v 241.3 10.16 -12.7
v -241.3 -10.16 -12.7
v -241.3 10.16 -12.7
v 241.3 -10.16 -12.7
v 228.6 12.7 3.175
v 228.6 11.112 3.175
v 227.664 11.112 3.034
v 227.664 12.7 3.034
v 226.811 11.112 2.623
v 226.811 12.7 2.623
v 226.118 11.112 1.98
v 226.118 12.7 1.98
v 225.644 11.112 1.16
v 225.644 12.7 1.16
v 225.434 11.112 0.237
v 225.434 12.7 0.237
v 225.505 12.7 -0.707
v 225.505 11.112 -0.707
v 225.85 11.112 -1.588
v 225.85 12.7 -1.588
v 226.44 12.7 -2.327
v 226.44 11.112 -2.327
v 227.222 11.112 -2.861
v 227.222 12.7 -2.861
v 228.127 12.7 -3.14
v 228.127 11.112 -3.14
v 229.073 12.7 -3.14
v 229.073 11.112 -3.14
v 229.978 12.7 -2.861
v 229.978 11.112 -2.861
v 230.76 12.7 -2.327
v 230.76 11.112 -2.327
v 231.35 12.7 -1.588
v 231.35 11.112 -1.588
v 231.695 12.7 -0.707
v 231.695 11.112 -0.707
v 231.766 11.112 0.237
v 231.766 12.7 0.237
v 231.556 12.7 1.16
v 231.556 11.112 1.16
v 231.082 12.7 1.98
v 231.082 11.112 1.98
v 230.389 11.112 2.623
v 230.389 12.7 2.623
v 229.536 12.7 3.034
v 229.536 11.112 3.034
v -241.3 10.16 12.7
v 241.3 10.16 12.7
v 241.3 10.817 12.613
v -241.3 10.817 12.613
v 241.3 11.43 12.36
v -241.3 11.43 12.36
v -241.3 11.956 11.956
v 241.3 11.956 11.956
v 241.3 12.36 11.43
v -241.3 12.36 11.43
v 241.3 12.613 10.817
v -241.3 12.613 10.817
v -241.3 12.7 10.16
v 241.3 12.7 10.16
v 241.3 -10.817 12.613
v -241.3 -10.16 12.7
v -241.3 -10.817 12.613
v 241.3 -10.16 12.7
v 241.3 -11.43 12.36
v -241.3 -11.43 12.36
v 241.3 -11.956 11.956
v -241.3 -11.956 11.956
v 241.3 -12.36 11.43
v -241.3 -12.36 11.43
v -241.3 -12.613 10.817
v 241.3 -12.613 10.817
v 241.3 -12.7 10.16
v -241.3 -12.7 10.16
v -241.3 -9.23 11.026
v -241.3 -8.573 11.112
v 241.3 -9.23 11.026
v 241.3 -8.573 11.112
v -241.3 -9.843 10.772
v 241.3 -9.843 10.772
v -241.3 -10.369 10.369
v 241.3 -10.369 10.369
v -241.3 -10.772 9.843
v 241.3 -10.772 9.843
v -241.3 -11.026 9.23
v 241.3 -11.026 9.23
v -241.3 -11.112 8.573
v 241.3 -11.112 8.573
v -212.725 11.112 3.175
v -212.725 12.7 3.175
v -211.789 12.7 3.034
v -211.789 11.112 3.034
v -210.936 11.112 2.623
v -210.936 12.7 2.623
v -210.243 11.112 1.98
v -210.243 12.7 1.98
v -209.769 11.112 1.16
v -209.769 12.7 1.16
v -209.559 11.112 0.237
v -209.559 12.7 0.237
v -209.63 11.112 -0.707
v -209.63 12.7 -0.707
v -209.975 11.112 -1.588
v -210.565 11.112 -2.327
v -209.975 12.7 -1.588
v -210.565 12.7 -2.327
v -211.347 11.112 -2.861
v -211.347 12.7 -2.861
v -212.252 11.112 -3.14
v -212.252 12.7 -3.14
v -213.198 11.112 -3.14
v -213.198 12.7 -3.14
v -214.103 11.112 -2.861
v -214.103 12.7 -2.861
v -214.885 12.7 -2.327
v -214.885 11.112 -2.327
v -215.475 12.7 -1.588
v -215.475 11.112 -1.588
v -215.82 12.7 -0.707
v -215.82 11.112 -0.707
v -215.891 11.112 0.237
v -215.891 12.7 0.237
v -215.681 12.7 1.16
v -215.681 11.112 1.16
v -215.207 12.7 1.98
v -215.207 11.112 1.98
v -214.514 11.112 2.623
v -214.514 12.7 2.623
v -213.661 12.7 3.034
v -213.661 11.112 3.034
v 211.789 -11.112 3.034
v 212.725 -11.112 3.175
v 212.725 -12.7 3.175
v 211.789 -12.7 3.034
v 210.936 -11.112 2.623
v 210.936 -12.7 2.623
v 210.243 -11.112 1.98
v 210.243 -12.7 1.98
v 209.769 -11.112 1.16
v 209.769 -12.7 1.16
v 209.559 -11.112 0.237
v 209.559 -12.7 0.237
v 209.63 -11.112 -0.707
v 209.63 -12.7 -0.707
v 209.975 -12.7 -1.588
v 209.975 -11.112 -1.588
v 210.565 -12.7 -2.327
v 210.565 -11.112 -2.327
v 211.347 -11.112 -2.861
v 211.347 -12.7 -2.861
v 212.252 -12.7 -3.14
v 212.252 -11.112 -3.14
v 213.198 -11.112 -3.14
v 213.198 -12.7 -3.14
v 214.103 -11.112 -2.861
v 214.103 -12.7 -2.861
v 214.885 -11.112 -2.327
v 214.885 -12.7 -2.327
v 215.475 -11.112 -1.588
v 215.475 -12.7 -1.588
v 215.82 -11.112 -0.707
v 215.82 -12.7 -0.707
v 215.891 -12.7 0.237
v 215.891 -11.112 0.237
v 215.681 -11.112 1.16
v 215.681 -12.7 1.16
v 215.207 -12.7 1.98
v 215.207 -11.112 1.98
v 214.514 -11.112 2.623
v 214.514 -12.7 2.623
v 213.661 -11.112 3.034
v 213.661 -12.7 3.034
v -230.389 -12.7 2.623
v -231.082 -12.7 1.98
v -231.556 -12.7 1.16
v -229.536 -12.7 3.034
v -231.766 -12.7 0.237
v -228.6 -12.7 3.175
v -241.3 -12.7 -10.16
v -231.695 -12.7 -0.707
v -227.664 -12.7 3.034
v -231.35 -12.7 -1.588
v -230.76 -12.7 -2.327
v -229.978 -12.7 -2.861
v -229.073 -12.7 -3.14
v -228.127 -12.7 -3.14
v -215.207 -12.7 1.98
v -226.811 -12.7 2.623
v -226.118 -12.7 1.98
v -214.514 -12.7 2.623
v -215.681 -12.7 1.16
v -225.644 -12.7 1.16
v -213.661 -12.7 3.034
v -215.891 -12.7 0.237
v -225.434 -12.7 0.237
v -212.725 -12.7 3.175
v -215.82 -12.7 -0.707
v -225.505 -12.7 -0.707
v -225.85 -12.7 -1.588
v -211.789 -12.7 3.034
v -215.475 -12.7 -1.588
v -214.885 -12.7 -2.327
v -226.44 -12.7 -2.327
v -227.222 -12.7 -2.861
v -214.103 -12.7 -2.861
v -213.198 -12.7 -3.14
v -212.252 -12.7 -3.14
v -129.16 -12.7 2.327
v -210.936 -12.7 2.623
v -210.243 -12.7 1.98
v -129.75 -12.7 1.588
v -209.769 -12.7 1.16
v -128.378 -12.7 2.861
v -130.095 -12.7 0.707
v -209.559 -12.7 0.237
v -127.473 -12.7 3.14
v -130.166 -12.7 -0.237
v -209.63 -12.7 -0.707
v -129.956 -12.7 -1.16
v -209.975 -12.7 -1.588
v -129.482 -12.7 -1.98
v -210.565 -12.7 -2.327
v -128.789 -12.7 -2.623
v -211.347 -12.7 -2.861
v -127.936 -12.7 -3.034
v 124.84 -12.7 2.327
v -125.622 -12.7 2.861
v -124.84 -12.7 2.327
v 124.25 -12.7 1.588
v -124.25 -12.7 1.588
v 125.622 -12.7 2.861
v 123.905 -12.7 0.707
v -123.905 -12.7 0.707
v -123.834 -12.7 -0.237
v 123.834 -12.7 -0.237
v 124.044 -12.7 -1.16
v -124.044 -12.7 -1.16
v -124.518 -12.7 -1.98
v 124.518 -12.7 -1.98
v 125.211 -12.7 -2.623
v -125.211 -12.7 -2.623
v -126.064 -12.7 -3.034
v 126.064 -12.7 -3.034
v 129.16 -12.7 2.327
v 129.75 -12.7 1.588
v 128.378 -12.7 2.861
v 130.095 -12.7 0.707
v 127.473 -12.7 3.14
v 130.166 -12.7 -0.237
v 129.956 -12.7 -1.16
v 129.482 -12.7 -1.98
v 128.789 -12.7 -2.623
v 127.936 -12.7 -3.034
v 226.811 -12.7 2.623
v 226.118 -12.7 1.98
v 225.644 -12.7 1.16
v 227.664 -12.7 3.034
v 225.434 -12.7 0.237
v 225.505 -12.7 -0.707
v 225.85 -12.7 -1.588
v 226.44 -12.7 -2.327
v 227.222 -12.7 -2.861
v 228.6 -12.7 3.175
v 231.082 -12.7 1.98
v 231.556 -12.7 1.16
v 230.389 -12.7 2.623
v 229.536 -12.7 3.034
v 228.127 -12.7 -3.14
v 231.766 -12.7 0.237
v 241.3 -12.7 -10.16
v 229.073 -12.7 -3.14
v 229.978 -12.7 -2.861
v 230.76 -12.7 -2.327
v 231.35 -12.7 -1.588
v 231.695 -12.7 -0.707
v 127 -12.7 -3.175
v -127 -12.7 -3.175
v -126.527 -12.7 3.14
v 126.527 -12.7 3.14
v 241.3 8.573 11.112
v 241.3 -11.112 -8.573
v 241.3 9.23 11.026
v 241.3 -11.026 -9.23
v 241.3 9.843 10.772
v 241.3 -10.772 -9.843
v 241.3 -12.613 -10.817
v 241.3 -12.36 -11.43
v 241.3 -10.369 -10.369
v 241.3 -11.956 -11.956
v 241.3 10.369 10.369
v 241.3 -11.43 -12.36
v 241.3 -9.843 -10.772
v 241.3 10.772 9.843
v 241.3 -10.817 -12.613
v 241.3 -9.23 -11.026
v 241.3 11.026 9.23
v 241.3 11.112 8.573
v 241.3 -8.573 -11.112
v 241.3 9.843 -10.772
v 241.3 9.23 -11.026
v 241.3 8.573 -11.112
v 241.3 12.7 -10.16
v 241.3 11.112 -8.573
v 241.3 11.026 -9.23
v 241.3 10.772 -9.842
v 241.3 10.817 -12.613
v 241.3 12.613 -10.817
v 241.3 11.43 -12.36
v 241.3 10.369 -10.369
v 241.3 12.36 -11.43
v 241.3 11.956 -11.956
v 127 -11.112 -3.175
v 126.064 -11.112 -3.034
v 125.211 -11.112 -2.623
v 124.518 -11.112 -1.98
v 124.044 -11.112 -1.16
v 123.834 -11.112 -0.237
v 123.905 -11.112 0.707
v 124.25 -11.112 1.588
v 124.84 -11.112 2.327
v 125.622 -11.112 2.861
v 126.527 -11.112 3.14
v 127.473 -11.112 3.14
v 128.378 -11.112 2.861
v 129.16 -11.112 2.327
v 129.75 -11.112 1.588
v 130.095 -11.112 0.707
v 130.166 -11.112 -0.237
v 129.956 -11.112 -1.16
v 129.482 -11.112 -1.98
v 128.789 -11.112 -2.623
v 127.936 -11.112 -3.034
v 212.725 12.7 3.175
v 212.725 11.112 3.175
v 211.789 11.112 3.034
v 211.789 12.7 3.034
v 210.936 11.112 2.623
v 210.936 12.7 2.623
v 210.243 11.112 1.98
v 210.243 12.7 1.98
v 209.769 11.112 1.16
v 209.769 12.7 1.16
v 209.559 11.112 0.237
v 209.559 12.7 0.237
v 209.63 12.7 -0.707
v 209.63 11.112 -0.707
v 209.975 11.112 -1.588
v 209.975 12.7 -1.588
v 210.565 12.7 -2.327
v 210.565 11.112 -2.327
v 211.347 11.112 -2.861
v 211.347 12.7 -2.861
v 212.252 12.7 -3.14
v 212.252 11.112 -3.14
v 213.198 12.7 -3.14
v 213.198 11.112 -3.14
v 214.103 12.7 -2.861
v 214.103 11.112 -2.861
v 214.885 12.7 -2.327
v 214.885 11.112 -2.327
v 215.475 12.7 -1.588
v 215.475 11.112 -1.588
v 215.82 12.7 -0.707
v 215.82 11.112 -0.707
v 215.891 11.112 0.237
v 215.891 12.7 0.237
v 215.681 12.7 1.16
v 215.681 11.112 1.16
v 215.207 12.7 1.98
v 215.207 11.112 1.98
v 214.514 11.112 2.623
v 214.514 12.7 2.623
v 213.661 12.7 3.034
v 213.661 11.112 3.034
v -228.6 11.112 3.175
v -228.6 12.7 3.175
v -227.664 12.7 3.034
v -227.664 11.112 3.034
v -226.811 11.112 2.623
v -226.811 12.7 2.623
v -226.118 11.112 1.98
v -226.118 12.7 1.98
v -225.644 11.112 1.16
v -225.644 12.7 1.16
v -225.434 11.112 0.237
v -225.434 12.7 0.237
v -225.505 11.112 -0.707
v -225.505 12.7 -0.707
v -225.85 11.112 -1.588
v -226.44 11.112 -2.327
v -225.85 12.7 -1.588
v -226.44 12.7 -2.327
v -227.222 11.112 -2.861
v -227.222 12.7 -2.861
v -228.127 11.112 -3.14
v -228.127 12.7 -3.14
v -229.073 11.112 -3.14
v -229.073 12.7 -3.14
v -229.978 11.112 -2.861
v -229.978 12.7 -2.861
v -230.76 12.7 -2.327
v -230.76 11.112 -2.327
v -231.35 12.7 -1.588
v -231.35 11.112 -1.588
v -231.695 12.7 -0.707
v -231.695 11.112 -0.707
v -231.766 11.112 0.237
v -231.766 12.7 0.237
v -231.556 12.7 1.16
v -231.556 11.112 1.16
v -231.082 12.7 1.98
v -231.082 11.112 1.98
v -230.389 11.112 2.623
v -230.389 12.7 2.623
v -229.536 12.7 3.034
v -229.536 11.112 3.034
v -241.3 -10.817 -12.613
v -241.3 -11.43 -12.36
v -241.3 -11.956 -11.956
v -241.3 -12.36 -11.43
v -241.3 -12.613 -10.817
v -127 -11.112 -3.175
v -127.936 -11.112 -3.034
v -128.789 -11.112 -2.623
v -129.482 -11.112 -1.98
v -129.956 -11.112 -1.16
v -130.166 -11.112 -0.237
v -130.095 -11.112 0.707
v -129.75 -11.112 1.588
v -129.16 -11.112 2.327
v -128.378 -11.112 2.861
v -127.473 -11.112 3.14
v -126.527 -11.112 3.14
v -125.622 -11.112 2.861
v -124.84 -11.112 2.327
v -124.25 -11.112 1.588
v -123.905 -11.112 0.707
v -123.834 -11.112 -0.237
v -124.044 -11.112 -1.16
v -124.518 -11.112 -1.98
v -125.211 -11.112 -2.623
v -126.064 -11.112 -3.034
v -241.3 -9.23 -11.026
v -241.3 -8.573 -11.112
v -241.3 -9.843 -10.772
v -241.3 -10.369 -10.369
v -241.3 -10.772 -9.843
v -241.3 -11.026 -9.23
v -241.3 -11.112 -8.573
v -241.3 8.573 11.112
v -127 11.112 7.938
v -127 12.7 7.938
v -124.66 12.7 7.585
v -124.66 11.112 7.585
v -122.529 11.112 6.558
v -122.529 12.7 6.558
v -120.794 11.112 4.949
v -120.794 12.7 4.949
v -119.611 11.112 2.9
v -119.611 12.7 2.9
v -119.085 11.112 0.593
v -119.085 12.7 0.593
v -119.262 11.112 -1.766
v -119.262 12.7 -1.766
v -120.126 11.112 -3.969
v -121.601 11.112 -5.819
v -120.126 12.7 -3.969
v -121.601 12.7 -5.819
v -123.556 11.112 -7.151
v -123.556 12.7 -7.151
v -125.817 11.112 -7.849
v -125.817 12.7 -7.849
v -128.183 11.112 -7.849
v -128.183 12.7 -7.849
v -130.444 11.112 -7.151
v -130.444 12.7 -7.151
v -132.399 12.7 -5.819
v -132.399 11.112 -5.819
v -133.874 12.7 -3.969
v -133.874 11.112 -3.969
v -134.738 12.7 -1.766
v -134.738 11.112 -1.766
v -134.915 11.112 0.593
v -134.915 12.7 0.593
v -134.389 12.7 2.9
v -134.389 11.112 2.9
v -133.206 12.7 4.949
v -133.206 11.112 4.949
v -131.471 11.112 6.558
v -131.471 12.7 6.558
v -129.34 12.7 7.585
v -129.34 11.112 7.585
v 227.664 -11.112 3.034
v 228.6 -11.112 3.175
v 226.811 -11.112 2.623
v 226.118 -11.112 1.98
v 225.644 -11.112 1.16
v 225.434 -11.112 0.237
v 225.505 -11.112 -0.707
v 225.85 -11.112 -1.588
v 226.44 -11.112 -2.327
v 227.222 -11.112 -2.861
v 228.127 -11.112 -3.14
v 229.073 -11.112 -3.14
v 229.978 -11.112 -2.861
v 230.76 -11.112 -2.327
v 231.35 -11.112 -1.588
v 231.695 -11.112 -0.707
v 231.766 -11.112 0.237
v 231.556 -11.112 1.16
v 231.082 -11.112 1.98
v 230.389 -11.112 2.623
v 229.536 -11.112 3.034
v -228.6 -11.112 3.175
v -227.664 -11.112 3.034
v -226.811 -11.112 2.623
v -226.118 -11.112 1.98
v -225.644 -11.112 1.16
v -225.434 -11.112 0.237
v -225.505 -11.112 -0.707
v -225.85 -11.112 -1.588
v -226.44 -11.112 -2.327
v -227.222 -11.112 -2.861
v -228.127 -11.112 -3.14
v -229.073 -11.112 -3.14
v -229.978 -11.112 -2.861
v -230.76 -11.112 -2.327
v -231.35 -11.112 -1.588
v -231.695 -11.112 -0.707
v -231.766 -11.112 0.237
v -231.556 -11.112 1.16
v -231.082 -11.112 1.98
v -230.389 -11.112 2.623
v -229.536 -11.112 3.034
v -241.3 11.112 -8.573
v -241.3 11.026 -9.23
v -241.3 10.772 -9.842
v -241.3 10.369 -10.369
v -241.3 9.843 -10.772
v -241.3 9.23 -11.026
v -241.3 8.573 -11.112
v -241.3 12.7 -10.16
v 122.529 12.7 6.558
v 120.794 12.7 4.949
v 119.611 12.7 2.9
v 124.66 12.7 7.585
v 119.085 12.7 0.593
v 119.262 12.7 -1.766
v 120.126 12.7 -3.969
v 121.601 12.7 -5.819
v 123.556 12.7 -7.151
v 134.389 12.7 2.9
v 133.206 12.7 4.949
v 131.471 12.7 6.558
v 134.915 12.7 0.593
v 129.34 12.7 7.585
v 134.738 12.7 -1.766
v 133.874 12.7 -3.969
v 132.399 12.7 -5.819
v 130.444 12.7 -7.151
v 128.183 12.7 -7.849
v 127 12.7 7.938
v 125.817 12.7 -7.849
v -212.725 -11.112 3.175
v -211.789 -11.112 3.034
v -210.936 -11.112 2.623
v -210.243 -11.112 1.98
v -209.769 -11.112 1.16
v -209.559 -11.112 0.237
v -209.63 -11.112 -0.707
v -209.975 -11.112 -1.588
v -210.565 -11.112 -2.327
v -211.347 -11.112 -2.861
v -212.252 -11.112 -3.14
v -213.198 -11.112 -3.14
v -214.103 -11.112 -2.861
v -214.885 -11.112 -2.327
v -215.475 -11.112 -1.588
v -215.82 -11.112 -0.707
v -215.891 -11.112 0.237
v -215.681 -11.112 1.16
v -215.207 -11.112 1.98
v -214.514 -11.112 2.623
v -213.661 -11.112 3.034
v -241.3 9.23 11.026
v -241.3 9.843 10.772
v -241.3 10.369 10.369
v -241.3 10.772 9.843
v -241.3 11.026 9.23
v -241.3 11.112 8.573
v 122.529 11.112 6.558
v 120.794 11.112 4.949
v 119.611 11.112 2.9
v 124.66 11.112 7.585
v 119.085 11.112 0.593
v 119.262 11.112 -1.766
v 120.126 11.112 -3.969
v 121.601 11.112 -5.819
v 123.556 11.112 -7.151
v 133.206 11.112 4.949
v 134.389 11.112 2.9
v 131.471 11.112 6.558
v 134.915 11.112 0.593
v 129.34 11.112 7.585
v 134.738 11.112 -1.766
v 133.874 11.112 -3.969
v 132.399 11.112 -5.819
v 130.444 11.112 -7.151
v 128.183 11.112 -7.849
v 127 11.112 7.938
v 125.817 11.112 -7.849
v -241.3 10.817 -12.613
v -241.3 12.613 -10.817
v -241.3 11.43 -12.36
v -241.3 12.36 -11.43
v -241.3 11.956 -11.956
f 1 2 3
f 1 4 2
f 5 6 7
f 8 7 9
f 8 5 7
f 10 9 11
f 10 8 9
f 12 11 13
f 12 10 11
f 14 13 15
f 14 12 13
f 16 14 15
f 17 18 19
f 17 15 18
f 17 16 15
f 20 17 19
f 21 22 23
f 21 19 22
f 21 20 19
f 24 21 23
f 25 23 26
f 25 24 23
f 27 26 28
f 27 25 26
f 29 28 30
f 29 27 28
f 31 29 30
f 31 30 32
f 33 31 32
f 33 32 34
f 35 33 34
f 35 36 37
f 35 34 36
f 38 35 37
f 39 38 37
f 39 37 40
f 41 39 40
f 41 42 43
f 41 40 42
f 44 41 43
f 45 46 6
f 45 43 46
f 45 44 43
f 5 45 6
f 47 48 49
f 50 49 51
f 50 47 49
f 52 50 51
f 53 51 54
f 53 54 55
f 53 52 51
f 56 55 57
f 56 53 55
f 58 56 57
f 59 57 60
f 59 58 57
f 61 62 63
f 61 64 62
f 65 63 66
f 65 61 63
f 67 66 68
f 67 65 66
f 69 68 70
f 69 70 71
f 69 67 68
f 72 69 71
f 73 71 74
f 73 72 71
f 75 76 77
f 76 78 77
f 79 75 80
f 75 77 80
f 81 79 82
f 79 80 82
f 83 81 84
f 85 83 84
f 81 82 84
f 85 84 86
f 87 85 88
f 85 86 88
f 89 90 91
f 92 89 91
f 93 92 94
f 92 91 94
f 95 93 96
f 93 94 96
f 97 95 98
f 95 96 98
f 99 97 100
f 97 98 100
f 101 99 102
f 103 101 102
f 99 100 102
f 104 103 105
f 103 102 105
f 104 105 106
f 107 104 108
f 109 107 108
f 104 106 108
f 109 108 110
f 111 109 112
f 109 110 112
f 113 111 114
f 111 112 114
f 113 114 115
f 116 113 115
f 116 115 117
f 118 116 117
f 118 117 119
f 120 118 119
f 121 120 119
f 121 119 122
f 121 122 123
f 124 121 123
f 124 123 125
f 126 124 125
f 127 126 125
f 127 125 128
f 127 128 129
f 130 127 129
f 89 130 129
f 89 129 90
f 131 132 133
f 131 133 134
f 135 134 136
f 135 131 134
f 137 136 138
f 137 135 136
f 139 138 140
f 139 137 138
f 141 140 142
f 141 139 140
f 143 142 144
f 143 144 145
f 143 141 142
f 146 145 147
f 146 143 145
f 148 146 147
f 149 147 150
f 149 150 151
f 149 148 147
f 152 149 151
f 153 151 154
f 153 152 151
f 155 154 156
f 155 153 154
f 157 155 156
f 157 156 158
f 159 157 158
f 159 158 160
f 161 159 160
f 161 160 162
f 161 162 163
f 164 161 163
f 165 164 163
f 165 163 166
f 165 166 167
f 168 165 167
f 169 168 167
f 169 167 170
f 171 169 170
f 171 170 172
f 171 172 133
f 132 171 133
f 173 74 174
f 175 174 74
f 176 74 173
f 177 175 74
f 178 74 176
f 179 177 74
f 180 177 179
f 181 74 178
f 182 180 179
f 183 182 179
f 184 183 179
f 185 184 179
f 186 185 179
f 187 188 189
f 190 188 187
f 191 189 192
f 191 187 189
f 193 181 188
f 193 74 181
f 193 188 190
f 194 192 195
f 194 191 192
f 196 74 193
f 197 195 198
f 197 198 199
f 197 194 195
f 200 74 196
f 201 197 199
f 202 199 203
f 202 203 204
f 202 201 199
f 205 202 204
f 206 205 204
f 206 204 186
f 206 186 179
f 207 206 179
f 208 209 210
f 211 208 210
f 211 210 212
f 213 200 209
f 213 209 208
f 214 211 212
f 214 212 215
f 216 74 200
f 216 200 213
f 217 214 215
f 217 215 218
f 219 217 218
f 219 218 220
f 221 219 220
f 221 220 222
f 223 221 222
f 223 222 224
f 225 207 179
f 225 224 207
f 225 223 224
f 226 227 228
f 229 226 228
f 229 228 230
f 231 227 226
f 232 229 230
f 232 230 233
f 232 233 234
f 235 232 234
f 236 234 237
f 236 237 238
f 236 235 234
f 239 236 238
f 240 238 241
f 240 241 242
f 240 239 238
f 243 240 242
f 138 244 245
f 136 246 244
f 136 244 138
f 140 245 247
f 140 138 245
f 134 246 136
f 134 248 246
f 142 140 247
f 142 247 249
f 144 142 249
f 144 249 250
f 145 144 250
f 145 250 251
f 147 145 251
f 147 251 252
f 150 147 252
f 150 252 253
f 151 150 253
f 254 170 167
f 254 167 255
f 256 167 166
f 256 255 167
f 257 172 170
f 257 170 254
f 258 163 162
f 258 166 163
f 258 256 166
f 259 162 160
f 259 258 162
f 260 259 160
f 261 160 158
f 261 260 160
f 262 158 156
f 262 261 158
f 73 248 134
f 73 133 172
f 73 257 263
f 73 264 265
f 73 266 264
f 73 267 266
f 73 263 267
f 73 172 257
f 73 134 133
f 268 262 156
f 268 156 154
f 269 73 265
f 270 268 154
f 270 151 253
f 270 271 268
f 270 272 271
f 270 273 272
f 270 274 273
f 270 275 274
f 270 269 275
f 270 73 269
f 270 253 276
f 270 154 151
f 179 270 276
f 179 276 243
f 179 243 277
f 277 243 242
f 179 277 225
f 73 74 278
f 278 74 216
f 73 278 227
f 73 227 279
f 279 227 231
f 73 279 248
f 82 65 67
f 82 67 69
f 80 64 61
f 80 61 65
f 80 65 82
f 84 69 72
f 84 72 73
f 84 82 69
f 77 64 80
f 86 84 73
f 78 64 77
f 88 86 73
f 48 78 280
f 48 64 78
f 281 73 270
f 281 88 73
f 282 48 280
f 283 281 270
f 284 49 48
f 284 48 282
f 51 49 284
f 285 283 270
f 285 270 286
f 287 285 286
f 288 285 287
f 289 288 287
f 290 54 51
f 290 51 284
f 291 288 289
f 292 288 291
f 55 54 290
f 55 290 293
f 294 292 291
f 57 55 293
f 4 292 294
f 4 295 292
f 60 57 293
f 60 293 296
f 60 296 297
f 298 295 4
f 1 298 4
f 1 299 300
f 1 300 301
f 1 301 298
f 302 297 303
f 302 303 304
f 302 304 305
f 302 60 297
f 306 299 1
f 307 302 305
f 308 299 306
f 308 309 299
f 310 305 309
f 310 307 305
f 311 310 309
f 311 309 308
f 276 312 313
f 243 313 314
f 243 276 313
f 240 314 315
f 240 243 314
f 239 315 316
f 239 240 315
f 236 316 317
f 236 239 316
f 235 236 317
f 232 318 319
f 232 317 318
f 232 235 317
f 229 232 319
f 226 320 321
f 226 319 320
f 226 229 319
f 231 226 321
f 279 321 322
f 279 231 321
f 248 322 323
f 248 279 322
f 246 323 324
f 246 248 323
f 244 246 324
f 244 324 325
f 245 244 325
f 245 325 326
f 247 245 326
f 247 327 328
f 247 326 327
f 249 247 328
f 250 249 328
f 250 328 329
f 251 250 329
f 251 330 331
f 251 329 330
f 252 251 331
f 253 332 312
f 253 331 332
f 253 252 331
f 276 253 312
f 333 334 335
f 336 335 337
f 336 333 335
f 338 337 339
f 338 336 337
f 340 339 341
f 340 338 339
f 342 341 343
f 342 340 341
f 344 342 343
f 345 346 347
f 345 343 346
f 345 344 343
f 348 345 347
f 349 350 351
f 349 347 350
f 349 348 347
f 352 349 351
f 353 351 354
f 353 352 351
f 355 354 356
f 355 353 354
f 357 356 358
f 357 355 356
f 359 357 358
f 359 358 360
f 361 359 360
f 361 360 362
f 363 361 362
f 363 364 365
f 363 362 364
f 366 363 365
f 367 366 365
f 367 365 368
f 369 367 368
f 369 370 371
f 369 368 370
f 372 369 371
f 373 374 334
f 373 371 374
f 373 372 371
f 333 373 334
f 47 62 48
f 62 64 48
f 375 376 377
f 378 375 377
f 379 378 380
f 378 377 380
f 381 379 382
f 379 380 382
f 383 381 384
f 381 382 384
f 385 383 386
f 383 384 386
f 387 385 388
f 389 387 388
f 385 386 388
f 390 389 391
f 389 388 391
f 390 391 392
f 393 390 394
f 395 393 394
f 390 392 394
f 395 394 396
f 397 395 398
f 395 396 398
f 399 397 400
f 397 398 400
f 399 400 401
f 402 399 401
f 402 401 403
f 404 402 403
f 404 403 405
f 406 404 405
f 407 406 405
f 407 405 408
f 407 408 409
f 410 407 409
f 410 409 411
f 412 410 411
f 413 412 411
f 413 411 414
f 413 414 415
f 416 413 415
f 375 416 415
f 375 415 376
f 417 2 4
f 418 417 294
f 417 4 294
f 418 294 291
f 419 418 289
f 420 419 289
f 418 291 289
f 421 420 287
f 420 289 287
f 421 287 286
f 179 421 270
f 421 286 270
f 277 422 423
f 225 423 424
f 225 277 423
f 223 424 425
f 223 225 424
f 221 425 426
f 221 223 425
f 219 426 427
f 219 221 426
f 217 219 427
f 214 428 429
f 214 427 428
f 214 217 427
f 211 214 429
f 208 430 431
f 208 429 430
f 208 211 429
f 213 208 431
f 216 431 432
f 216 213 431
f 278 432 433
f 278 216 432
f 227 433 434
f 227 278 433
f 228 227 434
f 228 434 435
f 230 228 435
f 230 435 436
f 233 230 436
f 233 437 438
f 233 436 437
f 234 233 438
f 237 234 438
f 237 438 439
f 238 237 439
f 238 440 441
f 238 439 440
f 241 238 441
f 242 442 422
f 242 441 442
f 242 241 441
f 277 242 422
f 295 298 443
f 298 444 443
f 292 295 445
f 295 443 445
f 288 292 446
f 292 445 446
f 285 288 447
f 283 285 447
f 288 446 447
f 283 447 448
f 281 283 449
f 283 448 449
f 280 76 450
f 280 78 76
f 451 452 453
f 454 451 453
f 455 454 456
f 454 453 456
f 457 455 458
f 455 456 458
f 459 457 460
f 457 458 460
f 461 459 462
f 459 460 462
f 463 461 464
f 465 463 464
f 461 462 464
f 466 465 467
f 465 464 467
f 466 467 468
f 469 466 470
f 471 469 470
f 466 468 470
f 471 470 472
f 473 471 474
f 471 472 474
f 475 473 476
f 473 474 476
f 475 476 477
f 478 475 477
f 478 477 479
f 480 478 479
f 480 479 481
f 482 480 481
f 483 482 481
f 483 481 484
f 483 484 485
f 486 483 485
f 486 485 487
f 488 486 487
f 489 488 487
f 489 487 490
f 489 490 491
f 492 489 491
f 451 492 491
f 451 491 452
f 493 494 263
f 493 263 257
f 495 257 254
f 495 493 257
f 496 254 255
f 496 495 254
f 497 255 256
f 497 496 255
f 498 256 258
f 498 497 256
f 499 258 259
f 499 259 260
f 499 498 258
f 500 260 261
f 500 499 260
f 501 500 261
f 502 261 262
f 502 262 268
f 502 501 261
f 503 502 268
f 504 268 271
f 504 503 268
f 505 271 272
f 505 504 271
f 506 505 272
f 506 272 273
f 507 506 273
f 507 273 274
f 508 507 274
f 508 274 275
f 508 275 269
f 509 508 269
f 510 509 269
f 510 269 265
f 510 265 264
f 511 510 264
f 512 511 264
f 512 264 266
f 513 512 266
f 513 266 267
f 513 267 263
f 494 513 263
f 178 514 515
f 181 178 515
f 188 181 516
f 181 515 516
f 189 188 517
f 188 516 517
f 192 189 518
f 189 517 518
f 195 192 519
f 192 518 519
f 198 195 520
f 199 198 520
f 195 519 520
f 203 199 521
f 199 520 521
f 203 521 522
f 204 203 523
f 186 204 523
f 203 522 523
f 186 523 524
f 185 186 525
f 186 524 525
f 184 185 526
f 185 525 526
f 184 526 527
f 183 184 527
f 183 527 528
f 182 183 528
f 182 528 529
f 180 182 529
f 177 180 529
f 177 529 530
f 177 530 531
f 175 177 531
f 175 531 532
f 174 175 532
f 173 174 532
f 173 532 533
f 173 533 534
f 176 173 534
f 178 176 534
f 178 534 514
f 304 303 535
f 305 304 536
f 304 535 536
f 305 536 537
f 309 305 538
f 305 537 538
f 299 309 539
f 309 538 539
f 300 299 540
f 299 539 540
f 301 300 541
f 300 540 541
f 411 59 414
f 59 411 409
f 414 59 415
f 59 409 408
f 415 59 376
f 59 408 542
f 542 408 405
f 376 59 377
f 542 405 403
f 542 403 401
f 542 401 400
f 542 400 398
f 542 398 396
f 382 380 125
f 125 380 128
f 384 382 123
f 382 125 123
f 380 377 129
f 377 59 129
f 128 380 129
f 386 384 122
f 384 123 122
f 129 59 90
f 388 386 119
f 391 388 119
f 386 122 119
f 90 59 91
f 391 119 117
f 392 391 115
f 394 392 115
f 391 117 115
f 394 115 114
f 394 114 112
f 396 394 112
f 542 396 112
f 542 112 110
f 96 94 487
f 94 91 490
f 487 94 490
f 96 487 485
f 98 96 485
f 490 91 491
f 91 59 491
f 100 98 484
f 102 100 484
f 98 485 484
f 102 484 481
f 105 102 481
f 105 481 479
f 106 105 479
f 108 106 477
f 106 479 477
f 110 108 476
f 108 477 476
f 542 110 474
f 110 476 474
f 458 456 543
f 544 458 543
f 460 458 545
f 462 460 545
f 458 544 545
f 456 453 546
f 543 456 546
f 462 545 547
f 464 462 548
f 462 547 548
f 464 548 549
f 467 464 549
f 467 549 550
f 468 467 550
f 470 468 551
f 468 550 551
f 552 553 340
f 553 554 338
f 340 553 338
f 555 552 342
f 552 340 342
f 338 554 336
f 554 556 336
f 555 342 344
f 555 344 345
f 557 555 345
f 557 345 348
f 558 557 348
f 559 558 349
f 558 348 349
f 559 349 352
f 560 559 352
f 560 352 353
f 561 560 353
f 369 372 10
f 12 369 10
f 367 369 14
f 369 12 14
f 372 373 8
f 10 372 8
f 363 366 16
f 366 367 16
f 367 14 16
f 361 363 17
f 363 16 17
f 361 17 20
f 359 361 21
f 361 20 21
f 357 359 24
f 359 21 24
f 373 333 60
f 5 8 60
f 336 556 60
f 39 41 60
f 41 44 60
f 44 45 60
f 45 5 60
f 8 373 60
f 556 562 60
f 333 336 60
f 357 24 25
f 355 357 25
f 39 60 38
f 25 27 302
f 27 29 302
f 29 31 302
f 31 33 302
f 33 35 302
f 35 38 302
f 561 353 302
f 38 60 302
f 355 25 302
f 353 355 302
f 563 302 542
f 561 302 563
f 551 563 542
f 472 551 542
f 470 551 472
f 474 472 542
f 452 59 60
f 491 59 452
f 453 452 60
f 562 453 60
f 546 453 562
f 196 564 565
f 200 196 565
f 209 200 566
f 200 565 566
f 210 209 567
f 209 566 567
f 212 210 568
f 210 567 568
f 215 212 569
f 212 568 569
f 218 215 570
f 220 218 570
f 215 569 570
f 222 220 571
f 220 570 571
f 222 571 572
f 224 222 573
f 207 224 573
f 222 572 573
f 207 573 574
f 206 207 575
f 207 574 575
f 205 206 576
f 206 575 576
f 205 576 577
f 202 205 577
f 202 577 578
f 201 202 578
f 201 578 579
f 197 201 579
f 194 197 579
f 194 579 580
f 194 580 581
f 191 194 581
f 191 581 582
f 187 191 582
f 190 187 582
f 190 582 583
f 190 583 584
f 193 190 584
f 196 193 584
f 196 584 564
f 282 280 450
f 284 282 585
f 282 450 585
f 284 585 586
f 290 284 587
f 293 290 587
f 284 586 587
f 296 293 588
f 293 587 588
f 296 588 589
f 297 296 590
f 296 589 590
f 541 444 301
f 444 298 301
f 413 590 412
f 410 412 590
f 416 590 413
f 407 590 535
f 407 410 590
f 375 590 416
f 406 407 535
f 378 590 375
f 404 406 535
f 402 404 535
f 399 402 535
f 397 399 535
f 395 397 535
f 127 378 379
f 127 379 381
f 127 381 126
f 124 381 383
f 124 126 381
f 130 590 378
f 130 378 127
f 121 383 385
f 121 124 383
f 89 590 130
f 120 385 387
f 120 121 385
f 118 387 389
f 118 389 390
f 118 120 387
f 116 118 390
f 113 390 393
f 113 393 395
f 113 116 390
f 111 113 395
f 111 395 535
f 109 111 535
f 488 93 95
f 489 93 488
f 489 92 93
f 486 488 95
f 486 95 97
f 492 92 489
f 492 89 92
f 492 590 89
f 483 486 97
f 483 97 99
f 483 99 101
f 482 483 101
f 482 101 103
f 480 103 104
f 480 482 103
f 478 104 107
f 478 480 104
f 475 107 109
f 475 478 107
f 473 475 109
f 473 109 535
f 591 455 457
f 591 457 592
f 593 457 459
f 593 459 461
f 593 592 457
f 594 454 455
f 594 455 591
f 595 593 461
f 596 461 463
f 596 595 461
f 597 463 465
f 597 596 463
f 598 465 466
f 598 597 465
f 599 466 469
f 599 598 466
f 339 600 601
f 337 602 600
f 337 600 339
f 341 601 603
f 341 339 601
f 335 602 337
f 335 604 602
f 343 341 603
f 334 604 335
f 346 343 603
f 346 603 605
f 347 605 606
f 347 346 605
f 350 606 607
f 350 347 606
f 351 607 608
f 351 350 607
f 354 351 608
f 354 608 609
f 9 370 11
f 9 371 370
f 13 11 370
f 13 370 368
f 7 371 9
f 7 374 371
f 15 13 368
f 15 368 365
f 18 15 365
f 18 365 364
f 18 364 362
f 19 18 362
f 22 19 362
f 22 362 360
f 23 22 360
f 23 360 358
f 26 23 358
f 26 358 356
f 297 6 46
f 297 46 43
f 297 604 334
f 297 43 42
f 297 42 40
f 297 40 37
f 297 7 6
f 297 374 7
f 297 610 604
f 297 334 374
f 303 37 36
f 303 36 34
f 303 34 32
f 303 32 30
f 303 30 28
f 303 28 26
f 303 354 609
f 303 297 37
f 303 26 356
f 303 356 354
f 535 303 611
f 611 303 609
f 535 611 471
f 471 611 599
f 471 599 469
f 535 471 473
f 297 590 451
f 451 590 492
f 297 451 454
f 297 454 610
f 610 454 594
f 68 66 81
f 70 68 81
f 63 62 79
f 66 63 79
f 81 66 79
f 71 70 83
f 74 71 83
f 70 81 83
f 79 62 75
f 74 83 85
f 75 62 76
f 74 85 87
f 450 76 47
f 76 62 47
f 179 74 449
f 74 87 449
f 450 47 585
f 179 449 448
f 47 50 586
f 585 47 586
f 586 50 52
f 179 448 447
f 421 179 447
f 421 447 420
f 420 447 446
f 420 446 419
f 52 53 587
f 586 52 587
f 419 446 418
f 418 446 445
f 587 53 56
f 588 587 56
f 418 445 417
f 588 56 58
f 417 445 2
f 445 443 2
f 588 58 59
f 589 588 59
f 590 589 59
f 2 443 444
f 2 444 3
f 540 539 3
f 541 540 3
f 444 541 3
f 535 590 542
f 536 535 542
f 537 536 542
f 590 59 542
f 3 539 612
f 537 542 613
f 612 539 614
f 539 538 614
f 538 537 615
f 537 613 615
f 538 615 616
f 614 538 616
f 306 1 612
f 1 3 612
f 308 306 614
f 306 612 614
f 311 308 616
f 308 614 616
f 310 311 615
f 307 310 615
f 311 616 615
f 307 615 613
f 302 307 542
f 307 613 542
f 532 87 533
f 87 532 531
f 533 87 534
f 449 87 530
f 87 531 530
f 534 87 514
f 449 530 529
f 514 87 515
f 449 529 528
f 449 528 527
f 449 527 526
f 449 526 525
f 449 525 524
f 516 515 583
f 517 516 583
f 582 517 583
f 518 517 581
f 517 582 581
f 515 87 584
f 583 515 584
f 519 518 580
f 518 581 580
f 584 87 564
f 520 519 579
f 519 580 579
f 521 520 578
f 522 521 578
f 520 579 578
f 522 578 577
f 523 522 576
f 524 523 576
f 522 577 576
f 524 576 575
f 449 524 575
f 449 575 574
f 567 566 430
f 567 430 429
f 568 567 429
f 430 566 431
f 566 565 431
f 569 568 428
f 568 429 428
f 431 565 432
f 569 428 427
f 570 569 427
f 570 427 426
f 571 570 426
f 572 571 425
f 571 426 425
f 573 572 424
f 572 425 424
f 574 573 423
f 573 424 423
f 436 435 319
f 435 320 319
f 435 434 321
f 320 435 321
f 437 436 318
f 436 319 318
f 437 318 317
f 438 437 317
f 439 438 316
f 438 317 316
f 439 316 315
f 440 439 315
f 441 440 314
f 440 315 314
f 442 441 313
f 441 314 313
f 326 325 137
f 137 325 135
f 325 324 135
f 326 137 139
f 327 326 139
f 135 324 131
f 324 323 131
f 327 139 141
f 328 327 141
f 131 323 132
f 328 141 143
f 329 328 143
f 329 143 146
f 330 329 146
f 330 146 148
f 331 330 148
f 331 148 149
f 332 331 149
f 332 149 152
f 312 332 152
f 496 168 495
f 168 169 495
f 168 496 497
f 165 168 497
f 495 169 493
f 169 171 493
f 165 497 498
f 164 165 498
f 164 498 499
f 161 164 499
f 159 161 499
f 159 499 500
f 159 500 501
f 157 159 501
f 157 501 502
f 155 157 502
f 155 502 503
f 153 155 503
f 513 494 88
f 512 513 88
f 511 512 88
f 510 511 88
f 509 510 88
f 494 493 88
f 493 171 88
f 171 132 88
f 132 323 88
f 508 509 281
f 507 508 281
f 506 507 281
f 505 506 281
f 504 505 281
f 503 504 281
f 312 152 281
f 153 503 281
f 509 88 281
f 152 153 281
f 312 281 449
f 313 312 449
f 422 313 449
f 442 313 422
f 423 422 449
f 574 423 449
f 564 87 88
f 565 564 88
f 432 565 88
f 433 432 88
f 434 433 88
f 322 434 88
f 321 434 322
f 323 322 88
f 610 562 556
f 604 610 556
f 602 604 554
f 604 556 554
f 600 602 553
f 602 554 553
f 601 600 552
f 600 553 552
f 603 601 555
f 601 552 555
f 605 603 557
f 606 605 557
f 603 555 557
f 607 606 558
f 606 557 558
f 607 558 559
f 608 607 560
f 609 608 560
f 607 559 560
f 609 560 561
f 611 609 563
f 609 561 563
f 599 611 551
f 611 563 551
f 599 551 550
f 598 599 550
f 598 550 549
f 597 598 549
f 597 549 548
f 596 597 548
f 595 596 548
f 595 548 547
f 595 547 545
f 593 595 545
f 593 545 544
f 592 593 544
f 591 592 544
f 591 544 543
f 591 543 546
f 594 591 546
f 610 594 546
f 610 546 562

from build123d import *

# Parameters (mm, degrees)
SKETCH1_W           = 25.4
SKETCH1_H           = 25.4
SKETCH1_W_2         = 22.225
SKETCH1_H_2         = 22.225
BOSS_EXTRUDE1_DEPTH = 241.3
FILLET1_R           = 2.54
CUT_EXTRUDE1_REACH  = 244.965
SKETCH2_R           = 3.175
CUT_EXTRUDE2_REACH  = 244.965
SKETCH3_R           = 7.9375
CUT_EXTRUDE3_REACH  = 244.965
SKETCH4_R           = 3.175


with BuildPart() as part:
    # Sketch1 → Boss-Extrude1 (new, symmetric)
    with BuildSketch(Plane(origin=(0, 0, 0), x_dir=(0, 0, -1), z_dir=(1, 0, 0))):
        Rectangle(SKETCH1_W, SKETCH1_H)
        Rectangle(SKETCH1_W_2, SKETCH1_H_2, mode=Mode.SUBTRACT)
    extrude(amount=BOSS_EXTRUDE1_DEPTH, both=True)

    # Fillet1
    fillet1_edges = [part.edges().sort_by_distance(p)[0] for p in [
        (0, -11.1125, -11.1125),
        (0, 11.1125, -11.1125),
        (0, 11.1125, 11.1125),
        (0, -11.1125, 11.1125),
        (0, -12.7, -12.7),
        (0, -12.7, 12.7),
        (0, 12.7, 12.7),
        (0, 12.7, -12.7),
    ]]
    fillet(fillet1_edges, radius=FILLET1_R)

    # Sketch2 → Cut-Extrude1 (cut, up to next)
    with BuildSketch(Plane(origin=(0, -12.7, 0), x_dir=(1, 0, 0), z_dir=(0, 1, 0)), mode=Mode.PRIVATE) as cut_extrude1_sk1:
        with Locations(Location((127, 0, 0), (0, 0, 90))):
            Circle(SKETCH2_R)
    cut_extrude1_tool1 = extrude(cut_extrude1_sk1.sketch, amount=CUT_EXTRUDE1_REACH, mode=Mode.PRIVATE) & part.part
    # Sketch2 → Cut-Extrude1 (cut, up to next)
    with BuildSketch(Plane(origin=(0, -12.7, 0), x_dir=(1, 0, 0), z_dir=(0, 1, 0)), mode=Mode.PRIVATE) as cut_extrude1_sk2:
        with Locations(Location((-127, 0, 0), (0, 0, 90))):
            Circle(SKETCH2_R)
    cut_extrude1_tool2 = extrude(cut_extrude1_sk2.sketch, amount=CUT_EXTRUDE1_REACH, mode=Mode.PRIVATE) & part.part
    add(cut_extrude1_tool1.solids().sort_by_distance((127, -12.7, 0))[0], mode=Mode.SUBTRACT)
    add(cut_extrude1_tool2.solids().sort_by_distance((-127, -12.7, 0))[0], mode=Mode.SUBTRACT)

    # Sketch3 → Cut-Extrude2 (cut, up to next)
    with BuildSketch(Plane(origin=(0, 12.7, 0), x_dir=(1, 0, 0), z_dir=(0, 1, 0)), mode=Mode.PRIVATE) as cut_extrude2_sk1:
        with Locations(Location((-127, 0, 0), (0, 0, 270))):
            Circle(SKETCH3_R)
    cut_extrude2_tool1 = extrude(cut_extrude2_sk1.sketch, amount=-CUT_EXTRUDE2_REACH, mode=Mode.PRIVATE) & part.part
    # Sketch3 → Cut-Extrude2 (cut, up to next)
    with BuildSketch(Plane(origin=(0, 12.7, 0), x_dir=(1, 0, 0), z_dir=(0, 1, 0)), mode=Mode.PRIVATE) as cut_extrude2_sk2:
        with Locations(Location((127, 0, 0), (0, 0, 270))):
            Circle(SKETCH3_R)
    cut_extrude2_tool2 = extrude(cut_extrude2_sk2.sketch, amount=-CUT_EXTRUDE2_REACH, mode=Mode.PRIVATE) & part.part
    add(cut_extrude2_tool1.solids().sort_by_distance((-127, 12.7, 0))[0], mode=Mode.SUBTRACT)
    add(cut_extrude2_tool2.solids().sort_by_distance((127, 12.7, 0))[0], mode=Mode.SUBTRACT)

    # Cut-Extrude3: up to this face of the body (flat: up to its plane)
    cut_extrude3_end = Plane(part.part.faces().sort_by_distance((0, -12.7, 0))[0])
    # Sketch4 → Cut-Extrude3 (cut, up to the picked face)
    with BuildSketch(Plane(origin=(0, 12.7, 0), x_dir=(1, 0, 0), z_dir=(0, 1, 0)), mode=Mode.PRIVATE) as cut_extrude3_sk1:
        with Locations(Location((-228.6, 0, 0), (0, 0, 270))):
            Circle(SKETCH4_R)
    cut_extrude3_tool1 = split(extrude(cut_extrude3_sk1.sketch, amount=-CUT_EXTRUDE3_REACH, mode=Mode.PRIVATE), bisect_by=cut_extrude3_end, keep=Keep.BOTH, mode=Mode.PRIVATE)
    # Sketch4 → Cut-Extrude3 (cut, up to the picked face)
    with BuildSketch(Plane(origin=(0, 12.7, 0), x_dir=(1, 0, 0), z_dir=(0, 1, 0)), mode=Mode.PRIVATE) as cut_extrude3_sk2:
        with Locations(Location((-212.725, 0, 0), (0, 0, 270))):
            Circle(SKETCH4_R)
    cut_extrude3_tool2 = split(extrude(cut_extrude3_sk2.sketch, amount=-CUT_EXTRUDE3_REACH, mode=Mode.PRIVATE), bisect_by=cut_extrude3_end, keep=Keep.BOTH, mode=Mode.PRIVATE)
    cut_extrude3_1 = cut_extrude3_tool1.solids().sort_by(Axis((-228.6, 12.7, 0), (0, -1, 0)))[0]
    add(cut_extrude3_1, mode=Mode.SUBTRACT)
    cut_extrude3_2 = cut_extrude3_tool2.solids().sort_by(Axis((-212.725, 12.7, 0), (0, -1, 0)))[0]
    add(cut_extrude3_2, mode=Mode.SUBTRACT)
    cut_extrude3 = cut_extrude3_1 + cut_extrude3_2  # Cut-Extrude3 as one shape, for the pattern or mirror that repeats it

    # Mirror1: Cut-Extrude3 across plane
    add(cut_extrude3.mirror(Plane(origin=(0, 0, 0), x_dir=(0, 0, 1), z_dir=(1, 0, 0))), mode=Mode.SUBTRACT)


solid = part.part
